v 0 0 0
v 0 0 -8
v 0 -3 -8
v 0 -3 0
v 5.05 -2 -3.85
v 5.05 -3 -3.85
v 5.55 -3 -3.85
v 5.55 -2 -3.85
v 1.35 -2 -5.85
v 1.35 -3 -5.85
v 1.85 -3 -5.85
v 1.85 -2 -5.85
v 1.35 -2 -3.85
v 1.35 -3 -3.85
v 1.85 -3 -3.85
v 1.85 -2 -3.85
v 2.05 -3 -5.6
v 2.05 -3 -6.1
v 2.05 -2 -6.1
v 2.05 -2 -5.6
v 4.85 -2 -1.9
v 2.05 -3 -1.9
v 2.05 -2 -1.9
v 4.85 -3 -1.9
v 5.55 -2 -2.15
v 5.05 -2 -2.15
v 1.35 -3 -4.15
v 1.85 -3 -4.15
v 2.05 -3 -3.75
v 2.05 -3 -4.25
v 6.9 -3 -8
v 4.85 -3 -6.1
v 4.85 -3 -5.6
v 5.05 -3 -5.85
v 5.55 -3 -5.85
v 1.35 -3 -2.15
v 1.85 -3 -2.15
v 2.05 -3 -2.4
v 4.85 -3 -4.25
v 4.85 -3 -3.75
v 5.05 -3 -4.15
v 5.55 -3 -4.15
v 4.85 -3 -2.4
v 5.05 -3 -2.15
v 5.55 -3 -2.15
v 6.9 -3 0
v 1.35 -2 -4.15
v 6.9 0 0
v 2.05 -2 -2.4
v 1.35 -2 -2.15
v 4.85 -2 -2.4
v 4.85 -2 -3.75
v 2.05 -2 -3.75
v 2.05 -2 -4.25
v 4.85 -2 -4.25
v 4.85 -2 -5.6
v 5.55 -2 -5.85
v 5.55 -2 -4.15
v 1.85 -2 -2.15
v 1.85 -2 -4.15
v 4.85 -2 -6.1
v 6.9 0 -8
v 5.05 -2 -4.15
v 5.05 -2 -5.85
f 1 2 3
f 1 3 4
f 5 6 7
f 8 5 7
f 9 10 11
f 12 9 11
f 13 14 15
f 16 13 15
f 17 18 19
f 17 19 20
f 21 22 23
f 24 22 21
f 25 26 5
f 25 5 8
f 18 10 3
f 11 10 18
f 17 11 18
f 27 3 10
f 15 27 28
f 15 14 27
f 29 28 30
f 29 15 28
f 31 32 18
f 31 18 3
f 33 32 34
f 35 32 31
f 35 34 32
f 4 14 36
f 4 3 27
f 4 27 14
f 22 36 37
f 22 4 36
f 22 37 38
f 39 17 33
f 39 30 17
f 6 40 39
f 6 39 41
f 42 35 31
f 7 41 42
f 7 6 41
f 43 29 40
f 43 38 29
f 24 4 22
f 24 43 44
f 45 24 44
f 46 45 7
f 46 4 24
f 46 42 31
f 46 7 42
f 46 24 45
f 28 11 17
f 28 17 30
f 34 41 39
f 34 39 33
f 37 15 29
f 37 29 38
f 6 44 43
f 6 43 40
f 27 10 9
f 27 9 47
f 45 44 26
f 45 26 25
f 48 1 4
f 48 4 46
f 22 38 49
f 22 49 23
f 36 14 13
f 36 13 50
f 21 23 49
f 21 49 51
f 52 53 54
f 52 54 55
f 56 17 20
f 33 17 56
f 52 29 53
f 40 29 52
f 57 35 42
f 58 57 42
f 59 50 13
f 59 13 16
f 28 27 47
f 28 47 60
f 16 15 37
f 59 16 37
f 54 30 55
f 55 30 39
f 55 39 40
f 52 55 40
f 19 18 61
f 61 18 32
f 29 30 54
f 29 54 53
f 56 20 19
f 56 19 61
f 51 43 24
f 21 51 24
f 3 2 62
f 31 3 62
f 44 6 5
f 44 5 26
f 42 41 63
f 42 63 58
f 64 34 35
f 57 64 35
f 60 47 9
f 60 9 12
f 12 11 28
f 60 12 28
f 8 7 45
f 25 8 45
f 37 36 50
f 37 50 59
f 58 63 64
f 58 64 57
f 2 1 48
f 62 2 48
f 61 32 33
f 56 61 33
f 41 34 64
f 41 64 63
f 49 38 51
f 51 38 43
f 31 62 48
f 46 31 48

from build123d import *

# Parameters (mm, degrees)
F0_W     = 6.9
F0_H     = 8
F1_DEPTH = 3
F2_W     = 2.8
F2_H     = 0.5
F2_W_2   = 0.5
F2_H_2   = 1.7
F3_DEPTH = 1


with BuildPart() as f1:
    # F0 (on Front) → F1 (new body)
    with BuildSketch(Plane.XZ):
        with Locations((3.45, -4)):
            Rectangle(F0_W, F0_H)
    extrude(amount=F1_DEPTH)

    # F2 (on face) → F3 (cut)
    with BuildSketch(Plane.XZ.offset(3)):
        with Locations((3.45, -2.15)):
            Rectangle(F2_W, F2_H)
        with Locations((3.45, -5.85)):
            Rectangle(F2_W, F2_H)
        with Locations((3.45, -4)):
            Rectangle(F2_W, F2_H)
        with Locations((1.6, -5)):
            Rectangle(F2_W_2, F2_H_2)
        with Locations((1.6, -3)):
            Rectangle(F2_W_2, F2_H_2)
        with Locations((5.3, -5)):
            Rectangle(F2_W_2, F2_H_2)
        with Locations((5.3, -3)):
            Rectangle(F2_W_2, F2_H_2)
    extrude(amount=-F3_DEPTH, mode=Mode.SUBTRACT)


solid = f1.part
